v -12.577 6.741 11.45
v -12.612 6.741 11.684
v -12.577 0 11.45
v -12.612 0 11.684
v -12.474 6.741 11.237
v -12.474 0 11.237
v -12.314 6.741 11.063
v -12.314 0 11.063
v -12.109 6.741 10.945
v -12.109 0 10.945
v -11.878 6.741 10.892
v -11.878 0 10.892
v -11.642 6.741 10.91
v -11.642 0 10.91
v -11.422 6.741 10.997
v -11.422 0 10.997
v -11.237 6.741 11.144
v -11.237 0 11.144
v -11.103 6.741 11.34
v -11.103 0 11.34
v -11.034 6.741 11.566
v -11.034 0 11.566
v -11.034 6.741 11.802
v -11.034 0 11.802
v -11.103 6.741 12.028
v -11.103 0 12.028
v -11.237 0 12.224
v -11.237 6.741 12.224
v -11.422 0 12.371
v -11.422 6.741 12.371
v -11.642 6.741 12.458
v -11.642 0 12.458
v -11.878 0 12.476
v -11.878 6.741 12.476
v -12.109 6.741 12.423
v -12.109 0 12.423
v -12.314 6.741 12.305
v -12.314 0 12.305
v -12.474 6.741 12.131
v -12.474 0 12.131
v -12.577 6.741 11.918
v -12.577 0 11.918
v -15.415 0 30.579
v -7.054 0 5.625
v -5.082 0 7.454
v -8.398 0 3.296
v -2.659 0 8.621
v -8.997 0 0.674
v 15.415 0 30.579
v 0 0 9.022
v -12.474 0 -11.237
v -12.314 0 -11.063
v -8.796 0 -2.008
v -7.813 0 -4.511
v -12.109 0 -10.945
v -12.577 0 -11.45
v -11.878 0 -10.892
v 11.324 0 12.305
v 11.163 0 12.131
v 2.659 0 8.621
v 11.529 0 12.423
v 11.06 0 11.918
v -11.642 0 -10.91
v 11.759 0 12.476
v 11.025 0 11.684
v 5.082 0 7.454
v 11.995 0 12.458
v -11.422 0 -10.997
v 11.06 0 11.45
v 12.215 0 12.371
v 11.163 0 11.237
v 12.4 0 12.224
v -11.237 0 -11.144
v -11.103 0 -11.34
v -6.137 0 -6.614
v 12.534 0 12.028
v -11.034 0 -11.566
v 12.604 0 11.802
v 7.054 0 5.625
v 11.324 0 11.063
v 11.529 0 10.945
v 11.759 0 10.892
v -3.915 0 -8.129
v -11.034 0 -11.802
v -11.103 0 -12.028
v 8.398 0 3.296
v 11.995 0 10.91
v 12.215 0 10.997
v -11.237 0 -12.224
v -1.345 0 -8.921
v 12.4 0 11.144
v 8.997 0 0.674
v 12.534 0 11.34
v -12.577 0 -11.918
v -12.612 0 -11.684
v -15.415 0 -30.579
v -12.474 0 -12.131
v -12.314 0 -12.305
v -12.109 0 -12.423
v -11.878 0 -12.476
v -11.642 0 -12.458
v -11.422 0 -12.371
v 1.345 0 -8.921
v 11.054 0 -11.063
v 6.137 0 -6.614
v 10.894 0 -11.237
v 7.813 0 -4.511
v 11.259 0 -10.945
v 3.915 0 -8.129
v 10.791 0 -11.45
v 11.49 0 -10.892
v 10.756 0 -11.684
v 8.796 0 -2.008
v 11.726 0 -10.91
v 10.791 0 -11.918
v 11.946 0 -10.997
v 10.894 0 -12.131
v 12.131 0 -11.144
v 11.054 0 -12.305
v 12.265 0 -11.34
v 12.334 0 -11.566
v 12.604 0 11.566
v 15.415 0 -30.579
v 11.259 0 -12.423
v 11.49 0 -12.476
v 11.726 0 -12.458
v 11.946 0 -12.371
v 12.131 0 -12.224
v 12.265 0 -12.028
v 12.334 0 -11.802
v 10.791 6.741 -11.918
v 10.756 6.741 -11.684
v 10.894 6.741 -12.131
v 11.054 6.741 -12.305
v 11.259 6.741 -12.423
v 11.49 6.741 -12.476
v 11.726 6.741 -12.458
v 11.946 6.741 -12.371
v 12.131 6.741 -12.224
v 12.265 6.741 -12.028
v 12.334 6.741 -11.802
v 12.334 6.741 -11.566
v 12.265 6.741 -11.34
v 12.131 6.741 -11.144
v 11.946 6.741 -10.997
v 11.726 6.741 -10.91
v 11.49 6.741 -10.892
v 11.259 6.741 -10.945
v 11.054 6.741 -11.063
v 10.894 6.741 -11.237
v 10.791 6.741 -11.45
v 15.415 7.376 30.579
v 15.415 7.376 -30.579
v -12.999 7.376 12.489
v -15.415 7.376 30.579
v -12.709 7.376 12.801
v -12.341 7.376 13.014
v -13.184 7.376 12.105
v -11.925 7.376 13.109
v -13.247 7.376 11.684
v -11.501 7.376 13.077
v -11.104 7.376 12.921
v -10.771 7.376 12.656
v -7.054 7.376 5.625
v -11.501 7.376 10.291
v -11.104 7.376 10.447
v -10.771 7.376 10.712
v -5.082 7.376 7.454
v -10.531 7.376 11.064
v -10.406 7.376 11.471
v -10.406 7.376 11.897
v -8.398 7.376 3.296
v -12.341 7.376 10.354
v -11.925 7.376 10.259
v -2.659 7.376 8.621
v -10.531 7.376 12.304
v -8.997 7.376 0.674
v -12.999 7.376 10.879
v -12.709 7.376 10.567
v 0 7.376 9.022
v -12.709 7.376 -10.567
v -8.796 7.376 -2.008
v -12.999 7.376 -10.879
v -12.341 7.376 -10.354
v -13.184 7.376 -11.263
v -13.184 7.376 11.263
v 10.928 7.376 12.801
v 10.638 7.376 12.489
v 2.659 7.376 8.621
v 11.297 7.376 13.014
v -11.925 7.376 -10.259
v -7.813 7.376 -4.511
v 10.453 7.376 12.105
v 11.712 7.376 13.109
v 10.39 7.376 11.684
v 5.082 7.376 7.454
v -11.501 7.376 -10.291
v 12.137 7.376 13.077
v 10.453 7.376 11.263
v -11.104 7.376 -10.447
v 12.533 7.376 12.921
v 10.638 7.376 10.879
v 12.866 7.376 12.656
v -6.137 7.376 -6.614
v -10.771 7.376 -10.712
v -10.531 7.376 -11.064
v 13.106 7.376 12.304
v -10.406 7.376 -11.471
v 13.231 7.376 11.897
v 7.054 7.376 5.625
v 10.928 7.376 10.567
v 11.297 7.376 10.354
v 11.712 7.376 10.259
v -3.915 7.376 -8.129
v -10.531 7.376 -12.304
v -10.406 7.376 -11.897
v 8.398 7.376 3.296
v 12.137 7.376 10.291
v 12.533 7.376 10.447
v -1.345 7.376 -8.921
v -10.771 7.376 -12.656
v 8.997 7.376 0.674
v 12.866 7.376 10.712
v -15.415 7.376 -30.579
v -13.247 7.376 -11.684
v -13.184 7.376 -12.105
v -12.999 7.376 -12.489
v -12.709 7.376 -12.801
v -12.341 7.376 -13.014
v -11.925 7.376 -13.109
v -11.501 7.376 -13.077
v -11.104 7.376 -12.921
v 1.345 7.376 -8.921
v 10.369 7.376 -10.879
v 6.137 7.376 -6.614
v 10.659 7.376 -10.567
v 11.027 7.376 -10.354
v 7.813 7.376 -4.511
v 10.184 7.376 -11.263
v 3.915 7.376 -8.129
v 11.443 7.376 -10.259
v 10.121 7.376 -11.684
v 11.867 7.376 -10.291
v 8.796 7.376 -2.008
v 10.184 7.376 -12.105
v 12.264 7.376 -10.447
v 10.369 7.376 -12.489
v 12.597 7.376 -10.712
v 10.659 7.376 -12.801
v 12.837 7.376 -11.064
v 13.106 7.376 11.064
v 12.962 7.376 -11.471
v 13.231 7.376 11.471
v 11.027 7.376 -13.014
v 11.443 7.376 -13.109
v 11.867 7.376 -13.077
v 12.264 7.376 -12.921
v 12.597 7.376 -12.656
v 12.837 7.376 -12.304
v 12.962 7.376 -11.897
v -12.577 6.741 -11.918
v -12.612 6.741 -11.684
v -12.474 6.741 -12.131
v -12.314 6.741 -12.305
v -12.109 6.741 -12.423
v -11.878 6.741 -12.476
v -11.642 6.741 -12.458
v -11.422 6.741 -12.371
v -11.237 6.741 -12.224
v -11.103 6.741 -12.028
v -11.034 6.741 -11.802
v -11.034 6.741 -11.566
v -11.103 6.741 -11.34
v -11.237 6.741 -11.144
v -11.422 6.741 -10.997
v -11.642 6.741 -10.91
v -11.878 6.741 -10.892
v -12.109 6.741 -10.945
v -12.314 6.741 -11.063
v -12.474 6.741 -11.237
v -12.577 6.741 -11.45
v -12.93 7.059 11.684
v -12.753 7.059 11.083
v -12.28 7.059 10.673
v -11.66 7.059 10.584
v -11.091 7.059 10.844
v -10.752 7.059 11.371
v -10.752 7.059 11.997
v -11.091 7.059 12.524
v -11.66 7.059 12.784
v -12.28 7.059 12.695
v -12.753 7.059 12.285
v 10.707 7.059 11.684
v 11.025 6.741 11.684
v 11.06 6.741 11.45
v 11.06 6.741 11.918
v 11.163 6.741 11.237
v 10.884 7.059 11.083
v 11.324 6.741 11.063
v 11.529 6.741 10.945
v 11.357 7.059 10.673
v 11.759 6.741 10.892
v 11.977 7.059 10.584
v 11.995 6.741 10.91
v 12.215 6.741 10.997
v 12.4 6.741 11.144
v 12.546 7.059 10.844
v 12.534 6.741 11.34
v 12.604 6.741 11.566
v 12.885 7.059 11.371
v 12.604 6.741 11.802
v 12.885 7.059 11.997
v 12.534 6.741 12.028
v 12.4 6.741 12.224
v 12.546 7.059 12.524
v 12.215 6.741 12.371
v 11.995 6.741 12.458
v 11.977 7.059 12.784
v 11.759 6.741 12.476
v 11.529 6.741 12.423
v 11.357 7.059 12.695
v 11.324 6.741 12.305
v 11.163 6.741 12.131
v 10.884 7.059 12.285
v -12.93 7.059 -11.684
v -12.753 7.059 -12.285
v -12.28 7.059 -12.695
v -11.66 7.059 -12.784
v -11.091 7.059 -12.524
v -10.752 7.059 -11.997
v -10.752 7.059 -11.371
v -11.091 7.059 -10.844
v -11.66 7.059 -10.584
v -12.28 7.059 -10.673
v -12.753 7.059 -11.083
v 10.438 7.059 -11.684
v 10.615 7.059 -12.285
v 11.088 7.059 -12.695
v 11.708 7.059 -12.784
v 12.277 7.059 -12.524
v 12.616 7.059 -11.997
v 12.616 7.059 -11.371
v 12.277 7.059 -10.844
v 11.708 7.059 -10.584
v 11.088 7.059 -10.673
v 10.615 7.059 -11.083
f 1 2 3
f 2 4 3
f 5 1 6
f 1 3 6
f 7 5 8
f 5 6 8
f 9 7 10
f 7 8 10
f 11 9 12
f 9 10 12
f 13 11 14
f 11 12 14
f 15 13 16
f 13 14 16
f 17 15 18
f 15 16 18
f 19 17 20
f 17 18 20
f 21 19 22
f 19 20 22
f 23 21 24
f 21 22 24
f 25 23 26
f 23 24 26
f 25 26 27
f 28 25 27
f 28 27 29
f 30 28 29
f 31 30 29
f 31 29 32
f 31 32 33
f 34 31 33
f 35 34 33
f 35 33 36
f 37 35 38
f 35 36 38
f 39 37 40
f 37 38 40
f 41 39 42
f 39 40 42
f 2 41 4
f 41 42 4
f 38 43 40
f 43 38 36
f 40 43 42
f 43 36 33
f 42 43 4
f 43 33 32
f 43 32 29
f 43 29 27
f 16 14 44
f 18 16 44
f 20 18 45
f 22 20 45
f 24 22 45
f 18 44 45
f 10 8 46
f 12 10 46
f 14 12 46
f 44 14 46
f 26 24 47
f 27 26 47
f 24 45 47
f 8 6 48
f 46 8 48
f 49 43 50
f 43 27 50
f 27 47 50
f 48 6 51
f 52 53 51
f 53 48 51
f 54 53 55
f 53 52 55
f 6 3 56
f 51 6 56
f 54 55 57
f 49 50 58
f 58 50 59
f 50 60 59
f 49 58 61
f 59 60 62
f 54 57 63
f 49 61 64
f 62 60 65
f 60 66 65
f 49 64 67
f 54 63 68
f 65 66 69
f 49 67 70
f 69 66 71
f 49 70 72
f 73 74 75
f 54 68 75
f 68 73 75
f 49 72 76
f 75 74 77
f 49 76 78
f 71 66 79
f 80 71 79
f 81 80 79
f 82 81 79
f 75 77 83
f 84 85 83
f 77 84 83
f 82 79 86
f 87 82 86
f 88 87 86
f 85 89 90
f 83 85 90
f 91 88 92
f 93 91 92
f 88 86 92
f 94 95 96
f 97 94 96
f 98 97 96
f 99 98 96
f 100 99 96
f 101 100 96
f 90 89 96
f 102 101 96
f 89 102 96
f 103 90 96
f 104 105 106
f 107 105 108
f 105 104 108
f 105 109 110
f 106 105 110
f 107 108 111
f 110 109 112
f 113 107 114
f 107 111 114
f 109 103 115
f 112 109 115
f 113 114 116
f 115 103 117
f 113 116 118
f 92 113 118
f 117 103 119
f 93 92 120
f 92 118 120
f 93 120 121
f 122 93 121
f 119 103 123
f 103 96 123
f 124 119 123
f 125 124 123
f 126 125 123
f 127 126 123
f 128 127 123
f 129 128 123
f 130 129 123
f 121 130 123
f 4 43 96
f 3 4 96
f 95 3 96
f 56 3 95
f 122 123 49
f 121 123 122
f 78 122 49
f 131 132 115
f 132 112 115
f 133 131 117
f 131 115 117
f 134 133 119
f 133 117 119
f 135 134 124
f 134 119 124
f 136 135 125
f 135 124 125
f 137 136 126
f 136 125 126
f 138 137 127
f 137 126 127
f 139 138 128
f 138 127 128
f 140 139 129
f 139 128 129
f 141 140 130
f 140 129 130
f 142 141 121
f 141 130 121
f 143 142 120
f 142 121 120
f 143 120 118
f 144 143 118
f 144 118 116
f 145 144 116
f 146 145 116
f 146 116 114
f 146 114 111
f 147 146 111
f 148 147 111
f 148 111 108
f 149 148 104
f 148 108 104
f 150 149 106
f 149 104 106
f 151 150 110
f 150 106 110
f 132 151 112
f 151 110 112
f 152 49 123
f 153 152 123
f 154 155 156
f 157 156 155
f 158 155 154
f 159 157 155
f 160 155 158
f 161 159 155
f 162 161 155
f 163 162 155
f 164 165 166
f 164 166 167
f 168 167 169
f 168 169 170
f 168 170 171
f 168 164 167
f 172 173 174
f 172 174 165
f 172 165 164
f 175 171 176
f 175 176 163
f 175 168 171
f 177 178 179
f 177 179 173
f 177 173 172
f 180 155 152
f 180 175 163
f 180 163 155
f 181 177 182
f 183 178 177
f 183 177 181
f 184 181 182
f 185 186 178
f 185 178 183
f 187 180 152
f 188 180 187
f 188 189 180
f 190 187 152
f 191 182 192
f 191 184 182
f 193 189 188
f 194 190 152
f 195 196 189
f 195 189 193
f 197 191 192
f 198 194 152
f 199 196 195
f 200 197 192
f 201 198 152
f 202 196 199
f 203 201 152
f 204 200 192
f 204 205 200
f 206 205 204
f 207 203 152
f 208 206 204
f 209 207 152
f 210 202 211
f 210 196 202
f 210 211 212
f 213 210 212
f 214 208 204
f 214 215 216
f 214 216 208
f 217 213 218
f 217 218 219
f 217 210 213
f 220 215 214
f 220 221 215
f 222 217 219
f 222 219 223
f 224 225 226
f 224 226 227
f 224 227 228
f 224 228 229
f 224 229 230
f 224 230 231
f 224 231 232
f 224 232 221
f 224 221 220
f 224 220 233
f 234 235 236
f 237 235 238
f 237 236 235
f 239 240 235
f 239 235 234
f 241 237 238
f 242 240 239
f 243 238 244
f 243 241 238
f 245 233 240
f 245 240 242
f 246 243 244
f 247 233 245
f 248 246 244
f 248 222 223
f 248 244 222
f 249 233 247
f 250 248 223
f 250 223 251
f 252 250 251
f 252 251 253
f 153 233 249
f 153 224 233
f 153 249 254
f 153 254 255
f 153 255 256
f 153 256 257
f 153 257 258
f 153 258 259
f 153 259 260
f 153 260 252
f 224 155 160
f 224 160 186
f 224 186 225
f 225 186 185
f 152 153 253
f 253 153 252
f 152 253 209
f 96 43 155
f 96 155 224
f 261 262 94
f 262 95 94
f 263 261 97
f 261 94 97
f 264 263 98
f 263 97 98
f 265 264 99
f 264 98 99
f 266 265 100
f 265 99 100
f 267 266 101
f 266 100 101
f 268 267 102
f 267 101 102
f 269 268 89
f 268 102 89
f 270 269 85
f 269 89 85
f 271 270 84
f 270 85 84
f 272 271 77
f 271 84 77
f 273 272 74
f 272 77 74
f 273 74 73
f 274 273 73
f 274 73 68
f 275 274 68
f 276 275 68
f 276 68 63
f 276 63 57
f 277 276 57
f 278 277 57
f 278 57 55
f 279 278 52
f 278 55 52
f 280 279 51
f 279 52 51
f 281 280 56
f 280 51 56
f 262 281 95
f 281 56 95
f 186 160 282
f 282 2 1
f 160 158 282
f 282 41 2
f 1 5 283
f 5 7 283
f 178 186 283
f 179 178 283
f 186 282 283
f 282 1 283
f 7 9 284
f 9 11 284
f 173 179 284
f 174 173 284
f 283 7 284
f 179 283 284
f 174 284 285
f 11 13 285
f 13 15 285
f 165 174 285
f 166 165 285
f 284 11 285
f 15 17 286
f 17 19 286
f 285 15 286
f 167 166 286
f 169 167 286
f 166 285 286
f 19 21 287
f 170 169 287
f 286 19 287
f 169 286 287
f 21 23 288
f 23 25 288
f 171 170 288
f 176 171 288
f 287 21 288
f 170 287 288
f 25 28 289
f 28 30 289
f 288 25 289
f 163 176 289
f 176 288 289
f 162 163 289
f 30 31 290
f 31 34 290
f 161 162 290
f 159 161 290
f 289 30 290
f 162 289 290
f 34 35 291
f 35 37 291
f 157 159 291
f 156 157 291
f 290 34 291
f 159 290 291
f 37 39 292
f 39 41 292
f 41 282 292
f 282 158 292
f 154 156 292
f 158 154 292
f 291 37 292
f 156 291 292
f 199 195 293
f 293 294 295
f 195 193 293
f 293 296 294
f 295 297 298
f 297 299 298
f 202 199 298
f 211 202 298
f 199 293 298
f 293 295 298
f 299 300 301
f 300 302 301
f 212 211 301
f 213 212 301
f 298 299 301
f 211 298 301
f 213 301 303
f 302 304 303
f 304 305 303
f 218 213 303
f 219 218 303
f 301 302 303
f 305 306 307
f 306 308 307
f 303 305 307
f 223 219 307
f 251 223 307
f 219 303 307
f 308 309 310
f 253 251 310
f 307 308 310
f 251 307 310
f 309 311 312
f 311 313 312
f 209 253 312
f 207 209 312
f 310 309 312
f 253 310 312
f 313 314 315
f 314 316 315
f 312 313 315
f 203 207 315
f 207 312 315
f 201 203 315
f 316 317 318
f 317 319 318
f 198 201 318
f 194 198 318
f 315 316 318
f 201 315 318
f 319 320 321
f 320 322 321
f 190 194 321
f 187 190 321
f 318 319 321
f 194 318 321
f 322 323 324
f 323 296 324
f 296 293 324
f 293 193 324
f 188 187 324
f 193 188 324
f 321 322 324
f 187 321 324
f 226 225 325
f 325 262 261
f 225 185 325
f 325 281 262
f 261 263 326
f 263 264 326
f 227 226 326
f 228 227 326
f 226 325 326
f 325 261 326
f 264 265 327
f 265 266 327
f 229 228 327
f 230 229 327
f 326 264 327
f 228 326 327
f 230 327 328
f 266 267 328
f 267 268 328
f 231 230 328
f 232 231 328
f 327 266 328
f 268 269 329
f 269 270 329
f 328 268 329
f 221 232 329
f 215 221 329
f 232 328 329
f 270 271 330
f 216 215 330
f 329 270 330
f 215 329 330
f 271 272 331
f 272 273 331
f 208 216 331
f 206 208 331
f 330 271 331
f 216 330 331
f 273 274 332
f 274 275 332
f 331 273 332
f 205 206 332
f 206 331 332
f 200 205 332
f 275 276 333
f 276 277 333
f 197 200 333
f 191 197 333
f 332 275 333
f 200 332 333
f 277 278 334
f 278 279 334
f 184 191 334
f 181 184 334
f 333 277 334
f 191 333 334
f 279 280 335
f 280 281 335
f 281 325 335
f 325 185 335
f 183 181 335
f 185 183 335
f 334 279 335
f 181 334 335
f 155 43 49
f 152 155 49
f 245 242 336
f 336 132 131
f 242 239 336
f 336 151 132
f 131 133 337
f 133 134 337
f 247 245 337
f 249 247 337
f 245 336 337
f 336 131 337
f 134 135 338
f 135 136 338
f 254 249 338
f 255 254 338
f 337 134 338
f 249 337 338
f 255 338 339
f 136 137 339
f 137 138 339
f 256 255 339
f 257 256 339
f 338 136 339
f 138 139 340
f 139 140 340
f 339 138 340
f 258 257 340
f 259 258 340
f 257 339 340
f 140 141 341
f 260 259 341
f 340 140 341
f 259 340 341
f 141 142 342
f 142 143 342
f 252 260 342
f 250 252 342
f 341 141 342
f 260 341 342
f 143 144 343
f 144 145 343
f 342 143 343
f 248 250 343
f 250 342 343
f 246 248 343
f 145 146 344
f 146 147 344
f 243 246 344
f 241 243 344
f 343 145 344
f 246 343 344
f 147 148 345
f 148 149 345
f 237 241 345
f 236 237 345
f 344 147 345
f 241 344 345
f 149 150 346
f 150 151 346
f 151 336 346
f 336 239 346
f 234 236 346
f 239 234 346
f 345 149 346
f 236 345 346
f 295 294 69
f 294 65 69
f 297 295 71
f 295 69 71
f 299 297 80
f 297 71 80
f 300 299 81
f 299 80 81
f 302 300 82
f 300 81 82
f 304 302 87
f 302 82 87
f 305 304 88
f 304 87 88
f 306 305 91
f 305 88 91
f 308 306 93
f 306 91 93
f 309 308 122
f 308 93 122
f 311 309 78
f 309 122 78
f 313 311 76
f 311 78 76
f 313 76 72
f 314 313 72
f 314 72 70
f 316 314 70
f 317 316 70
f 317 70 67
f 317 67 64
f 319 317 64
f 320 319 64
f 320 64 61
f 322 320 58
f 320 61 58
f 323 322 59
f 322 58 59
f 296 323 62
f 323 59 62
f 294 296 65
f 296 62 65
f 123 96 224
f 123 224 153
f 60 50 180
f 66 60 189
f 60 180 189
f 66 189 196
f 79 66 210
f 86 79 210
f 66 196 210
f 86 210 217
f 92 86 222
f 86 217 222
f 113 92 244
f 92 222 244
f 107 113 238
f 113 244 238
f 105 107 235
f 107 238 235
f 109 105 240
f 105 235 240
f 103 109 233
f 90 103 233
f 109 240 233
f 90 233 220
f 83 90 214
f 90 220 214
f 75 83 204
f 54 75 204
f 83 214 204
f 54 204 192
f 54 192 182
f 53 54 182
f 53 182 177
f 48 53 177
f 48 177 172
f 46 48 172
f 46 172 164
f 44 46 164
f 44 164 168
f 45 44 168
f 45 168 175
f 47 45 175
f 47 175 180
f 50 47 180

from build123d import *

# Parameters (mm, degrees)
SKETCH1_W                                = 30.83052
SKETCH1_H                                = 61.15812
BOSS_EXTRUDE1_DEPTH                      = 7.37616
SKETCH2_R                                = 9.02208
CUT_EXTRUDE1_DEPTH                       = 36.030228199
F_1_16_0_0625_DIAMETER_HOLE2_D           = 1.5875
F_1_16_0_0625_DIAMETER_HOLE2_CSINK_D     = 2.8575
F_1_16_0_0625_DIAMETER_HOLE2_CSINK_ANGLE = 90


with BuildPart() as part:
    # Sketch1 → Boss-Extrude1 (new body)
    with BuildSketch(Plane(origin=(0, 0, 0), x_dir=(1, 0, 0), z_dir=(0, 1, 0))):
        Rectangle(SKETCH1_W, SKETCH1_H)
    extrude(amount=BOSS_EXTRUDE1_DEPTH)

    # Sketch2 → Cut-Extrude1 (cut, through all)
    with BuildSketch(Plane(origin=(0, 7.37616, 0), x_dir=(1, 0, 0), z_dir=(0, 1, 0))):
        with Locations(Location((0, 0, 0), (0, 0, 270))):
            Circle(SKETCH2_R)
    extrude(amount=-CUT_EXTRUDE1_DEPTH, mode=Mode.SUBTRACT)

    # 1/16 (0.0625) Diameter Hole2 (through all)
    with Locations(Plane(origin=(0, 7.37616, 0), x_dir=(1, 0, 0), z_dir=(0, 1, 0))):
        with Locations((-11.81862, 11.684), (11.54938, 11.684), (11.81862, -11.684), (-11.81862, -11.684)):
            CounterSinkHole(F_1_16_0_0625_DIAMETER_HOLE2_D / 2, F_1_16_0_0625_DIAMETER_HOLE2_CSINK_D / 2, counter_sink_angle=F_1_16_0_0625_DIAMETER_HOLE2_CSINK_ANGLE)


solid = part.part
